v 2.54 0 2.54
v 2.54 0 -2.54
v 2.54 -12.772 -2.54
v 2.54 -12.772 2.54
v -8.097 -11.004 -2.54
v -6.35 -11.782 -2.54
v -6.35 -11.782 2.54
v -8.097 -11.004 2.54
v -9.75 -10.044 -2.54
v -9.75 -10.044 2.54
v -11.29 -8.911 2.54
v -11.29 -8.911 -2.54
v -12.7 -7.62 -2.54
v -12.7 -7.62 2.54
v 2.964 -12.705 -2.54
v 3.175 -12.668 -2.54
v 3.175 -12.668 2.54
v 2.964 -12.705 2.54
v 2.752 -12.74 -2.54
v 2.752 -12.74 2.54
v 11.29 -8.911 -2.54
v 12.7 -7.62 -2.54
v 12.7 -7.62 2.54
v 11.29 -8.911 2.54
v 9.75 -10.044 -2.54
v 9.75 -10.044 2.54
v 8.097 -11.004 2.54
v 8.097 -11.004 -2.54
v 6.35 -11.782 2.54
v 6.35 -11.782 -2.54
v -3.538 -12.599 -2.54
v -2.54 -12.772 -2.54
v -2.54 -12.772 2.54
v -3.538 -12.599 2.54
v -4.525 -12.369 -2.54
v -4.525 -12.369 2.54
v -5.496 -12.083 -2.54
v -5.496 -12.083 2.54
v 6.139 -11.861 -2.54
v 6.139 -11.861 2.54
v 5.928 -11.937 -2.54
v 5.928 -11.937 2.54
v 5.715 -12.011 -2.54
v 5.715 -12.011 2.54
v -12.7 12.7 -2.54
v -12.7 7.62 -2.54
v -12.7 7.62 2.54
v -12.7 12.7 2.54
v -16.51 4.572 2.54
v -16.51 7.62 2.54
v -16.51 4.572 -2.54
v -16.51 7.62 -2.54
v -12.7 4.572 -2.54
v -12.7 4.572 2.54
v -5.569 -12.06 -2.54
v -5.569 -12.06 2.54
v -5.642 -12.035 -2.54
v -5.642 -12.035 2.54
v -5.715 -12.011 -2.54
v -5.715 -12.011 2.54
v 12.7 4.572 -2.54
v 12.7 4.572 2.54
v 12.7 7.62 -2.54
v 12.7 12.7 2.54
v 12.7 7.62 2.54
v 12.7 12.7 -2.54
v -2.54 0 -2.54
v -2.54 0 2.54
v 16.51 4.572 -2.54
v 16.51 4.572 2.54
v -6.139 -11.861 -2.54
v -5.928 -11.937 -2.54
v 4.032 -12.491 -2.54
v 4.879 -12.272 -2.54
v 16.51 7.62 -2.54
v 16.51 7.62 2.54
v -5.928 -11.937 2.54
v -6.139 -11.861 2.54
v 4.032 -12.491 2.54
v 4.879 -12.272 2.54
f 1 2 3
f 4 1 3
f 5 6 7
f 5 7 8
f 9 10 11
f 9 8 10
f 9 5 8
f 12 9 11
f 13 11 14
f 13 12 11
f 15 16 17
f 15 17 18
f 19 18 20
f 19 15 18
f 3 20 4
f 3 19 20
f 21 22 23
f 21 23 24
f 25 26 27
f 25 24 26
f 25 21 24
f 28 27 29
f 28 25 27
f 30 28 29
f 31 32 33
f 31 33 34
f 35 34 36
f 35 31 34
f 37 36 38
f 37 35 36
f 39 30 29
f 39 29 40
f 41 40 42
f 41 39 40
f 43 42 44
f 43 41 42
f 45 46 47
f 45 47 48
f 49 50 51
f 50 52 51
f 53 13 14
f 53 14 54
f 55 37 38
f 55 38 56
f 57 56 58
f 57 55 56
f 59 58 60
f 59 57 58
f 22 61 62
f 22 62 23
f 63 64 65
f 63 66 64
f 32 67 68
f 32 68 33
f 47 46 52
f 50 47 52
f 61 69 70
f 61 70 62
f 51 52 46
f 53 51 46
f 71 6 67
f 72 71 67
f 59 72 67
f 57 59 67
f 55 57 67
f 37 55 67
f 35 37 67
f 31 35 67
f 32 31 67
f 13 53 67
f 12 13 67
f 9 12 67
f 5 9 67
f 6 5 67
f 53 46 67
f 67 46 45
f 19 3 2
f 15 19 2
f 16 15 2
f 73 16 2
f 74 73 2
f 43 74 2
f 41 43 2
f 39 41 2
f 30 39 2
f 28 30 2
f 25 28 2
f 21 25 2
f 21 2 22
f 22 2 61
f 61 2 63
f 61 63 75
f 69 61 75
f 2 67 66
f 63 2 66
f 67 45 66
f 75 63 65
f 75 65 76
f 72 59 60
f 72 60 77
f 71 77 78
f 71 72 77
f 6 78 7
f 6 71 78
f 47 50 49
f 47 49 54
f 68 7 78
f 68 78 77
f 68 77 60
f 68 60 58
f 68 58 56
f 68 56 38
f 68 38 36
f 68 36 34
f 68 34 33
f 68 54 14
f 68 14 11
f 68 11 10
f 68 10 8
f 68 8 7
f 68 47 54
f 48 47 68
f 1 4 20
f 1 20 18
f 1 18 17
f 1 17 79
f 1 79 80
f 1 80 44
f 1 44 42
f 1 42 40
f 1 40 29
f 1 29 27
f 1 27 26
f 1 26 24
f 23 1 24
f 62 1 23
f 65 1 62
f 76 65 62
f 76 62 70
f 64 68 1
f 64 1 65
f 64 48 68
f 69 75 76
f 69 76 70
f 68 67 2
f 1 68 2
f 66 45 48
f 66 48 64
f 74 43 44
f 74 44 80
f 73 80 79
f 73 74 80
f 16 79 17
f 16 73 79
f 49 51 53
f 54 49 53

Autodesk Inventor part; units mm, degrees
ref_plane "YZ Plane" through (0, 0, 0) normal (1, 0, 0) x (0, 1, 0)
ref_plane "XZ Plane" through (0, 0, 0) normal (0, 1, 0) x (-1, 0, 0)
ref_plane "XY Plane" through (0, 0, 0) normal (0, 0, 1) x (1, 0, 0)
sketch "Sketch1" plane through (0, 0, 0) normal (0, 0, 1) x (1, 0, 0)
  line L0 (-12.7, 7.62) -> (12.7, 7.62) construction
  line L1 (-12.7, -7.62) -> (12.7, 7.62) construction
  line L2 (-12.7, 7.62) -> (12.7, -7.62) construction
  line L3 (-6.35, -11.7818) -> (-6.35, 0) construction
  line L4 (-2.54, 0) -> (2.54, 0)
  line L5 (6.35, 0) -> (6.35, -11.7818) construction
  line L6 (-6.35, -12.954) -> (6.35, 0) construction
  line L7 (-6.35, 0) -> (6.35, -12.954) construction
  line L8 (-25.5271, -12.954) -> (-6.35, -12.954) construction
  line L9 (0, -12.954) -> (34.2013, -12.954) construction
  line L10 (-6.35, -7.62) -> (-12.7, -7.62) construction
  line L11 (12.7, -7.62) -> (6.35, -7.62) construction
  line L12 (-12.7, 7.62) -> (-12.7, 12.7)
  line L13 (-12.7, 12.7) -> (12.7, 12.7) construction
  line L14 (12.7, 12.7) -> (12.7, 7.62)
  arc A0 (-12.7, -7.62) -> (-6.35, -11.7818) centre (0, 4.832) ccw construction
  arc A1 (6.35, -11.7818) -> (12.7, -7.62) centre (0, 4.832) ccw
  line L15 (-12.7, 2.667) -> (-16.51, 2.667) construction
  line L16 (-16.51, 4.953) -> (-12.7, 4.953) construction
  line L17 (-8.89, 4.953) -> (-8.89, 2.667) construction
  line L18 (-8.89, 2.667) -> (-16.51, 4.953) construction
  line L19 (-16.51, 2.667) -> (-8.89, 4.953) construction
  line L20 (12.7, 2.667) -> (16.51, 2.667) construction
  line L21 (16.51, 4.953) -> (12.7, 4.953) construction
  line L22 (8.89, 4.953) -> (8.89, 2.667) construction
  line L23 (8.89, 2.667) -> (16.51, 4.953) construction
  line L24 (16.51, 2.667) -> (8.89, 4.953) construction
  line L25 (-12.7, -7.62) -> (-12.7, 2.286)
  line L26 (12.7, 2.286) -> (12.7, -7.62)
  line L27 (-12.7, 12.7) -> (12.7, 12.7)
  line L28 (-16.51, 4.953) -> (-16.51, 5.334)
  line L29 (6.35, 0) -> (5.715, 0) construction
  line L30 (-6.35, 0) -> (-5.715, 0) construction
  line L31 (-5.715, 0) -> (-5.715, -0.6477) construction
  line L32 (5.715, 0) -> (5.715, -0.6477) construction
  arc A2 (-6.35, -11.7818) -> (-5.715, -12.0108) centre (0, 4.832) ccw
  arc A3 (5.715, -12.0108) -> (6.35, -11.7818) centre (0, 4.832) ccw
  line L33 (-12.7, -7.62) -> (12.7, -7.62) construction
  line L34 (-5.715, 0) -> (-3.175, 0) construction
  line L35 (5.715, 0) -> (3.175, 0) construction
  arc A4 (-6.35, -11.7818) -> (-5.4965, -12.0834) centre (0, 4.832) ccw
  arc A5 (3.175, -12.6683) -> (12.7, -7.62) centre (0, 4.832) ccw
  line L36 (-12.7, 7.62) -> (-16.51, 7.62)
  line L37 (-16.51, 7.62) -> (-16.51, 4.572)
  line L38 (-16.51, 4.572) -> (-12.7, 4.572)
  line L39 (-12.7, 4.572) -> (-12.7, 1.9405)
  line L40 (12.7, 7.62) -> (16.51, 7.62)
  line L41 (16.51, 7.62) -> (16.51, 4.572)
  line L42 (16.51, 4.572) -> (12.7, 4.572)
  line L43 (12.7, 4.572) -> (12.7, 2.286)
  line L44 (-3.175, 0) -> (-2.54, 0) construction
  line L45 (-2.54, 0) -> (-2.54, -12.7717)
  line L46 (3.175, 0) -> (2.54, 0) construction
  line L47 (2.54, 0) -> (2.54, -12.7717)
  arc A6 (-12.7, -7.62) -> (-2.54, -12.7717) centre (0, 4.832) ccw
  arc A7 (2.54, -12.7717) -> (12.7, -7.62) centre (0, 4.832) ccw
  point P0 (0, 0)
  point P1 (0, -6.477)
  point P2 (-12.7, 3.81)
  point P3 (12.7, 3.81)
  dimension "d0" = 15.24
  dimension "d1" = 25.4
  dimension "d3" = 12.7
  dimension "d4" = 5.08
  dimension "d5" = 1.1722
  dimension "d7" = 7.62
  dimension "d8" = 2.286
  dimension "d9" = 7.62
  dimension "d17" = 0.635
  dimension "d18" = 0.635
  dimension "d19" = 90
  dimension "d22" = 2.54
  dimension "d24" = 2.54
  dimension "d30" = 3.81
  dimension "d31" = 3.048
  dimension "d33" = 3.81
  dimension "d36" = 0.635
  dimension "d37" = 0.635
extrude "Extrusion6" add sketch "Sketch1" along normal mid plane 5.08
sketch "Sketch2" plane through (0, 0, 2.54) normal (0, 0, 1) x (1, 0, 0)
  line L0 (-12.7, 4.572) -> (-12.7, -7.62) projected
  arc A0 (-12.7, -7.62) -> (-2.54, -12.7717) centre (0, 4.832) ccw projected
  line L1 (-2.54, -12.7717) -> (-2.54, 0) projected
  line L2 (-2.54, 0) -> (2.54, 0) projected
  line L3 (2.54, 0) -> (2.54, -12.7717) projected
  arc A1 (2.54, -12.7717) -> (12.7, -7.62) centre (0, 4.832) ccw projected
  line L4 (12.7, -7.62) -> (12.7, 4.572) projected
  line L5 (12.7, 4.572) -> (16.51, 4.572) projected
  line L6 (16.51, 4.572) -> (16.51, 7.62) projected
  line L7 (16.51, 7.62) -> (12.7, 7.62) projected
  line L8 (12.7, 7.62) -> (12.7, 12.7) projected
  line L9 (12.7, 12.7) -> (-12.7, 12.7) projected
  line L10 (-12.7, 12.7) -> (-12.7, 7.62) projected
  line L11 (-12.7, 7.62) -> (-16.51, 7.62) projected
  line L12 (-16.51, 7.62) -> (-16.51, 4.572) projected
  line L13 (-16.51, 4.572) -> (-12.7, 4.572) projected
  point P0 (0, 0)
properties part number "BottomPegCor"
